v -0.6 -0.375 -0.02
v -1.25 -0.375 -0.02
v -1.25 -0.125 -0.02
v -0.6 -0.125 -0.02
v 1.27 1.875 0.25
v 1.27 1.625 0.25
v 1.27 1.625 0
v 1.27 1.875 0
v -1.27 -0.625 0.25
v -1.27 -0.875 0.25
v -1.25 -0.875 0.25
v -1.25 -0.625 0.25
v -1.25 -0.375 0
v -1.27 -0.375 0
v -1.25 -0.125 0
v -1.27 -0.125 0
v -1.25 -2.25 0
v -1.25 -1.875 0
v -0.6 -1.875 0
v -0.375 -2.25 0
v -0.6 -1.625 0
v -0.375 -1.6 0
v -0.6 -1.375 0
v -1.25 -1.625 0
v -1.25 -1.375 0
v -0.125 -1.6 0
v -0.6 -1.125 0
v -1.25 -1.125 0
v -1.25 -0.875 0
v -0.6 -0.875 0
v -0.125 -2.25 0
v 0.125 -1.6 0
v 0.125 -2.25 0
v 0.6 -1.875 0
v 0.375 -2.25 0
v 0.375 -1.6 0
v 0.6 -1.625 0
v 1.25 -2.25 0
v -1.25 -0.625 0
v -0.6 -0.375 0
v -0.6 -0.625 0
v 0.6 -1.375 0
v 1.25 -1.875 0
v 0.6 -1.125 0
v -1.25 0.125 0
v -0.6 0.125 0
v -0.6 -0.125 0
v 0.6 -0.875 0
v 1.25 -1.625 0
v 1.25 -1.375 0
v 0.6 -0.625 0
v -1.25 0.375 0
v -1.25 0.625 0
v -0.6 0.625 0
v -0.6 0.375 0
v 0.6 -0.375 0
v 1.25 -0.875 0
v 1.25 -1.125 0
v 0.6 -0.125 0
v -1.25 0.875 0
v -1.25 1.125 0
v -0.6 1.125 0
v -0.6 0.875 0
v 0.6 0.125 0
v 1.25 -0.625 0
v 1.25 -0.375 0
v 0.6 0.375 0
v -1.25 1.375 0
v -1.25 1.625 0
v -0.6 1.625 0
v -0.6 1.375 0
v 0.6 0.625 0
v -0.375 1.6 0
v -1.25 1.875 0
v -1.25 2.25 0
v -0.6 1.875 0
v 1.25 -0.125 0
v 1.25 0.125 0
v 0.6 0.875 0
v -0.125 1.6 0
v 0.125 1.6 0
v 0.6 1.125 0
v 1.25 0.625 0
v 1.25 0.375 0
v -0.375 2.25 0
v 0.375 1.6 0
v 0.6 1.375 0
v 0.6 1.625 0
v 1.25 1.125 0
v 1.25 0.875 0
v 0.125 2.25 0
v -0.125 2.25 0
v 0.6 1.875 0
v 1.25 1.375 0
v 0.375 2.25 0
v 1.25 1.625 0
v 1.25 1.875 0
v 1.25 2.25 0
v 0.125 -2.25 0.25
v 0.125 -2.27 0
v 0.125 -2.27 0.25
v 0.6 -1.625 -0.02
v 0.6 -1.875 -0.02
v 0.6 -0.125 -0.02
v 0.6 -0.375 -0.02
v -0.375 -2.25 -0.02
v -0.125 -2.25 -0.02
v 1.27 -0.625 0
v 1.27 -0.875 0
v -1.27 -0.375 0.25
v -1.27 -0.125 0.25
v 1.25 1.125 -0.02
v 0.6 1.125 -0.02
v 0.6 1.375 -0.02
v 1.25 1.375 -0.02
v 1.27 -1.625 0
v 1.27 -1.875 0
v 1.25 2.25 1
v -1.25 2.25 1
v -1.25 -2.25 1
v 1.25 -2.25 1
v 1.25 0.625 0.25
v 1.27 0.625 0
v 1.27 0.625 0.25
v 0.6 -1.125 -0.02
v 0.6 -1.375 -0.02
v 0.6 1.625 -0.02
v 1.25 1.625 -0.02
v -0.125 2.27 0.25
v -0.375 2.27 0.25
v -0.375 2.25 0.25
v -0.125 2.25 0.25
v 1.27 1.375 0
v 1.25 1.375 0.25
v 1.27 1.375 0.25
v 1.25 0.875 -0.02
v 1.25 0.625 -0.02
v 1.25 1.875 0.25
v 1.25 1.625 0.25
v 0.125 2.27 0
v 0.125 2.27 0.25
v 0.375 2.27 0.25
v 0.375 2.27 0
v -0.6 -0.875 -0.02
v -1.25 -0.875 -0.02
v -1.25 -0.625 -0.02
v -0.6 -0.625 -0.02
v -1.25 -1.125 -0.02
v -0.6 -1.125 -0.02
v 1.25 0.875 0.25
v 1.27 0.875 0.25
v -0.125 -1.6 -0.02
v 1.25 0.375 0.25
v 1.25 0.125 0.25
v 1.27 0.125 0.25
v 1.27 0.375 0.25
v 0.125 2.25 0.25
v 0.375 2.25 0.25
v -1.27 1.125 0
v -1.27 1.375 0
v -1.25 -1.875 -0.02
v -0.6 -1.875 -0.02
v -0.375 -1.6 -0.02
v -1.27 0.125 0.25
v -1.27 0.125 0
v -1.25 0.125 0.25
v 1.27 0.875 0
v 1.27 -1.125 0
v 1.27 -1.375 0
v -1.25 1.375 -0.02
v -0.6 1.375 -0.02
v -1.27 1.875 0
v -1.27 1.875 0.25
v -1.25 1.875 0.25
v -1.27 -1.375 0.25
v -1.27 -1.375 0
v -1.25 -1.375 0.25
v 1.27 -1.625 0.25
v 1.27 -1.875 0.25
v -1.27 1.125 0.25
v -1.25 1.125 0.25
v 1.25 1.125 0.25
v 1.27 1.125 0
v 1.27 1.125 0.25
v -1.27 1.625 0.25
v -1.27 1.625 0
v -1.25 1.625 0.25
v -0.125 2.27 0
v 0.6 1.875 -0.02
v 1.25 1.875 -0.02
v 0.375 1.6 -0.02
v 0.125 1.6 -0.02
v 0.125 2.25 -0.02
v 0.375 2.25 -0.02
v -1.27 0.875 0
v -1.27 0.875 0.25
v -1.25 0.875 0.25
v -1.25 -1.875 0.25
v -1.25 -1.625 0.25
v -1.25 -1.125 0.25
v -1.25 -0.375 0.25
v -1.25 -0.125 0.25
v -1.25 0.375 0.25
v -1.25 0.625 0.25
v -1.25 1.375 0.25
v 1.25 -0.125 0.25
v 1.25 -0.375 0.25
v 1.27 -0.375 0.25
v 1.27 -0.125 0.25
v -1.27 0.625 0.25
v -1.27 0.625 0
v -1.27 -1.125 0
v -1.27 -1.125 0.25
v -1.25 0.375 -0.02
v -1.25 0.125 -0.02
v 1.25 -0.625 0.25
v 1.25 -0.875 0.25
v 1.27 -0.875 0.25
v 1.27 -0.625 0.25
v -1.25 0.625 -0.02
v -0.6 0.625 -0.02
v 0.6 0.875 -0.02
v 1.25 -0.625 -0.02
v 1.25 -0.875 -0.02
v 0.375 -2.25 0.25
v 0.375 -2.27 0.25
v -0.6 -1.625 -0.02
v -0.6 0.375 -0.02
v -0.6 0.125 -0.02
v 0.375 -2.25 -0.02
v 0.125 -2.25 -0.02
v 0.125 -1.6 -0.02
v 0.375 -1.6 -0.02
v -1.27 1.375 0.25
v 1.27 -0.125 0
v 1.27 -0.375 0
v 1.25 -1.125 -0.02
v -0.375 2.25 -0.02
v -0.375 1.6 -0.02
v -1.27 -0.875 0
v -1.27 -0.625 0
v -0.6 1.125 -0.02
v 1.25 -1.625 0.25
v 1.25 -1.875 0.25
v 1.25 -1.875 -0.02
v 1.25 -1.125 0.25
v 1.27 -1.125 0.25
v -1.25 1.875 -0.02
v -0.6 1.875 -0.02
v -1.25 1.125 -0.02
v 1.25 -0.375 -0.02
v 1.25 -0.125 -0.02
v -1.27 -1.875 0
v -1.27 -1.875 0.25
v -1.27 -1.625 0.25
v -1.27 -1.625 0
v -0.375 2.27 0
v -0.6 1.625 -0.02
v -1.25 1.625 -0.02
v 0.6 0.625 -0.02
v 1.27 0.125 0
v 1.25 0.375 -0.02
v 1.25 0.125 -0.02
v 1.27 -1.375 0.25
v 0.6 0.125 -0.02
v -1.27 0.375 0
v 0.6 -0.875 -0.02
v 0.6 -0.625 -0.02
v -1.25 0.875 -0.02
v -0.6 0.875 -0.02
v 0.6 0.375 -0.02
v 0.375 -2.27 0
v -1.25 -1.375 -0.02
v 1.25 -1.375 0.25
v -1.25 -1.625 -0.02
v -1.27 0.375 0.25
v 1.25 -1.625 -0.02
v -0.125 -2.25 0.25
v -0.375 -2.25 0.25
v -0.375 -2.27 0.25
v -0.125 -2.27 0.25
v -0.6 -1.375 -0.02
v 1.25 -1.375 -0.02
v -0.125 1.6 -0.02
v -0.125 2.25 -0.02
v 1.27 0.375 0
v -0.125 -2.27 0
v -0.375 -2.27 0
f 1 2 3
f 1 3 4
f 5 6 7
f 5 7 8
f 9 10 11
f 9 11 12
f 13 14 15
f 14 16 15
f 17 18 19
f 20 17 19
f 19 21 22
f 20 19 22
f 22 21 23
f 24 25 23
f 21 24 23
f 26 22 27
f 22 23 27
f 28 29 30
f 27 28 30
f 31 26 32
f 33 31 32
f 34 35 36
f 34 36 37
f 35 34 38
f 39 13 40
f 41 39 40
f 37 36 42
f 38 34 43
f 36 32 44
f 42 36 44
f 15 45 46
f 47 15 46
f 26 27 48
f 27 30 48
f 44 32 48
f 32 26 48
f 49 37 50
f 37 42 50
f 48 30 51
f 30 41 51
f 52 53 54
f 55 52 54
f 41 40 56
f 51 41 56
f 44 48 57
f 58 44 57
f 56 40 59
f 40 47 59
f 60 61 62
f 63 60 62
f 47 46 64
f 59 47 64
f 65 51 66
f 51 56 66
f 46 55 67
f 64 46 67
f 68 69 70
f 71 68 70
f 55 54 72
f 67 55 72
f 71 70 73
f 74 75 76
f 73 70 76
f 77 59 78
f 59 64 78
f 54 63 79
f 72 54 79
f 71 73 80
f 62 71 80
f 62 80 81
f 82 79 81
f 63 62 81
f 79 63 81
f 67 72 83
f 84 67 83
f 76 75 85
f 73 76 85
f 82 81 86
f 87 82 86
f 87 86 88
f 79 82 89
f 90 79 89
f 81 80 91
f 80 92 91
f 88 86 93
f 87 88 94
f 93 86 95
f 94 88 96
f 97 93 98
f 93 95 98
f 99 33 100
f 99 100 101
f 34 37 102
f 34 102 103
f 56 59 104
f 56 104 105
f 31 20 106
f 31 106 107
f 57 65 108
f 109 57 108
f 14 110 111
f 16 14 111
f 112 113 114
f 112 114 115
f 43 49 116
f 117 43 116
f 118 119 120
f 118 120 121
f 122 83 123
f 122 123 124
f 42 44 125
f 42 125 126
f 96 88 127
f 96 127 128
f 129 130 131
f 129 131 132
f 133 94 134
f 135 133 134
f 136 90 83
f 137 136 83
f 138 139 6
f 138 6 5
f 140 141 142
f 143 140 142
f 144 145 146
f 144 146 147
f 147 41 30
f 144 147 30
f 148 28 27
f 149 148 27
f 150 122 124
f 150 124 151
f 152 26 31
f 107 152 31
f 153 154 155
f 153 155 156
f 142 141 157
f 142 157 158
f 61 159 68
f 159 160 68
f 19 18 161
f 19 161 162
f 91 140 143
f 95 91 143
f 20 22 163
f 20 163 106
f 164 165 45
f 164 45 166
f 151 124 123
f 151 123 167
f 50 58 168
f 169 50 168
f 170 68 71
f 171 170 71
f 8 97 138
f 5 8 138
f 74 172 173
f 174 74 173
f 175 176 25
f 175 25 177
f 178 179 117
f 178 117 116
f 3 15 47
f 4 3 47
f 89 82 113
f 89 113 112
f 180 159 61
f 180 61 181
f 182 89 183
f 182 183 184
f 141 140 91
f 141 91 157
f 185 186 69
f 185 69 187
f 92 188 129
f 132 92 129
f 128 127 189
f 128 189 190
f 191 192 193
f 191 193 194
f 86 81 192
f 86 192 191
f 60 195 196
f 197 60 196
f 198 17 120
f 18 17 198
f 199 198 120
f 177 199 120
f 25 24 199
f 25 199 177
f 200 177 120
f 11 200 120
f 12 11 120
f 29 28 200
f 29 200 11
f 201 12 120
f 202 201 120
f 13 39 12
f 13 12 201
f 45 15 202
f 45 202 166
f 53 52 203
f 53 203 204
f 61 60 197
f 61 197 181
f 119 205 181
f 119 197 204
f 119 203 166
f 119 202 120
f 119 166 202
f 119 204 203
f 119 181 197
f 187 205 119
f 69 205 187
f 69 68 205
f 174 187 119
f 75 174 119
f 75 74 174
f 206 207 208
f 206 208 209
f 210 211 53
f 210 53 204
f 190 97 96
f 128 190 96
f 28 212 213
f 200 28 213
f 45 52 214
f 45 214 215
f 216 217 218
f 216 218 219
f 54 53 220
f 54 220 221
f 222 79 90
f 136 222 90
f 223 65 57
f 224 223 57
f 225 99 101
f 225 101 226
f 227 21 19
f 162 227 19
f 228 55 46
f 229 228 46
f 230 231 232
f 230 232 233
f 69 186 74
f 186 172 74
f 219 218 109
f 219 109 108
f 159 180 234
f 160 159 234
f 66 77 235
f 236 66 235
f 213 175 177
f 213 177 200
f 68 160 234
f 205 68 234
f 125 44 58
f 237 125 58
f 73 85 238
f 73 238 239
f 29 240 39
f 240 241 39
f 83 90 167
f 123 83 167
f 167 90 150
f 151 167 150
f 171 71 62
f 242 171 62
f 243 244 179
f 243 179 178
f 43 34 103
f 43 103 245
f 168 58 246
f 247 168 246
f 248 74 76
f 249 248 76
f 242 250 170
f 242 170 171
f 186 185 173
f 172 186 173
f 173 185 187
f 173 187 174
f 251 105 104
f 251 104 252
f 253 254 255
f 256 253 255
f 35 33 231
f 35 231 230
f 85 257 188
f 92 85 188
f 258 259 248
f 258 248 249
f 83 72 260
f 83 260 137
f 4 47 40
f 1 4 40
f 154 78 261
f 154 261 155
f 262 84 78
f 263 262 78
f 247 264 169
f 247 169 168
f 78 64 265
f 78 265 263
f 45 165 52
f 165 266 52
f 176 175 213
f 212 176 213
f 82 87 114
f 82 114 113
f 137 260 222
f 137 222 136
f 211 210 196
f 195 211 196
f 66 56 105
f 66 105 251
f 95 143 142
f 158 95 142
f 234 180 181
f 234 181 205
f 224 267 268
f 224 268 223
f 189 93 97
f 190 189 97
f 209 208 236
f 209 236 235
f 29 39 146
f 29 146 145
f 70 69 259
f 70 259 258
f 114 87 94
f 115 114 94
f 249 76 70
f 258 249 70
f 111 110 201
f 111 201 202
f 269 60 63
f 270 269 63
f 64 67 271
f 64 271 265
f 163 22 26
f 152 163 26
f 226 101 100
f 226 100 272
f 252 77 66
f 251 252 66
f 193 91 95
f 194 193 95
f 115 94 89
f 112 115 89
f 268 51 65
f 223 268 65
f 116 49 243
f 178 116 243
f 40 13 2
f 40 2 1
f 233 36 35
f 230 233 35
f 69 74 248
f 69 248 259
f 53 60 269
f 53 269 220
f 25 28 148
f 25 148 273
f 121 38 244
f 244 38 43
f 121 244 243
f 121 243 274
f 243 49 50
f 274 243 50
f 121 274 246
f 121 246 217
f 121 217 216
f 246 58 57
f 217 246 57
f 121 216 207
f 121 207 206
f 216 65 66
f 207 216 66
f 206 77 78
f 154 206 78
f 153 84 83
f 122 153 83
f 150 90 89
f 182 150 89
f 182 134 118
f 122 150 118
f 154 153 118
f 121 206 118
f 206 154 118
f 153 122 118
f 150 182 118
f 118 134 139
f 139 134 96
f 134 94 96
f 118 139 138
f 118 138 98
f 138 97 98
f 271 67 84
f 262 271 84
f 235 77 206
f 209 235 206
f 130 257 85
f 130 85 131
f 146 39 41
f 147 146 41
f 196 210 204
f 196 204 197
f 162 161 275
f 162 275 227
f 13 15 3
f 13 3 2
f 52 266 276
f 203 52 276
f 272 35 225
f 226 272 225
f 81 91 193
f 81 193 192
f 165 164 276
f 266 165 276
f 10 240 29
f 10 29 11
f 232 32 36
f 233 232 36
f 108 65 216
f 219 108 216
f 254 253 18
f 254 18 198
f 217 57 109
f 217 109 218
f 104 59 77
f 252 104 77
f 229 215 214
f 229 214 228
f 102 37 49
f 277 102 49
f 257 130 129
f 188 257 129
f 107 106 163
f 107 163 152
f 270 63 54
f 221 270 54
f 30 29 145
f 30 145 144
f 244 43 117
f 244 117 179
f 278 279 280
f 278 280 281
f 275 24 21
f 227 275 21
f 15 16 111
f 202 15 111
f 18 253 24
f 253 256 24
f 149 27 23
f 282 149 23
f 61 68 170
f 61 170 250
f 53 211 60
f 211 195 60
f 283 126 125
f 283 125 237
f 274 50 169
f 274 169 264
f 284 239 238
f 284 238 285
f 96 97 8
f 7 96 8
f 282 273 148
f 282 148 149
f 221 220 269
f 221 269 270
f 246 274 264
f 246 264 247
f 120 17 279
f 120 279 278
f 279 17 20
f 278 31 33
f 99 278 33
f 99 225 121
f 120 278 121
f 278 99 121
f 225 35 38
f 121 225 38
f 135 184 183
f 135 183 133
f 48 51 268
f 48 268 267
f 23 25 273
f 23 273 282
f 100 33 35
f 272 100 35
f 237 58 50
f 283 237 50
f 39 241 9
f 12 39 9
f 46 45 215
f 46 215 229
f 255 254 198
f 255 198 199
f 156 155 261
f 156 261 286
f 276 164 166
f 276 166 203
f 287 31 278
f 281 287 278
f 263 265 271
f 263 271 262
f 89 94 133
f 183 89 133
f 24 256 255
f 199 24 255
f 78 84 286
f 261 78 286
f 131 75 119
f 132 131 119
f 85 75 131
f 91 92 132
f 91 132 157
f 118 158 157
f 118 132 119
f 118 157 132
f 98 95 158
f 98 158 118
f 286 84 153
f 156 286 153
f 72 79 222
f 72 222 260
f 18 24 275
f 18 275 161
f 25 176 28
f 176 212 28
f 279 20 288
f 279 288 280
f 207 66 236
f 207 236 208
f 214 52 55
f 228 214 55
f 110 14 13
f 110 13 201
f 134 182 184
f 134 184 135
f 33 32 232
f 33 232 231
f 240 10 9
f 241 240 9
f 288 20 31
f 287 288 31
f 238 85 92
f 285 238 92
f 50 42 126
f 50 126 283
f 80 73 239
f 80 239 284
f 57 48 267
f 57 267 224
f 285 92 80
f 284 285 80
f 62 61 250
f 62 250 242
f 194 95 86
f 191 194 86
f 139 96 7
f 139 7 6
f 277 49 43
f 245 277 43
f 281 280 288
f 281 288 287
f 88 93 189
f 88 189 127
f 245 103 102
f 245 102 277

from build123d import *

# Parameters (mm, degrees)
SKETCH_W               = 2.5
SKETCH_H               = 4.5
PAD_DEPTH              = 1
SKETCH001_W            = 0.25
SKETCH001_H            = 0.25
PAD001_DEPTH           = 0.02
LINEARPATTERN_COUNT    = 2
LINEARPATTERN_PITCH    = 2.52
SKETCH002_W            = 0.25
SKETCH002_H            = 0.25
PAD002_DEPTH           = 0.02
LINEARPATTERN001_COUNT = 2
LINEARPATTERN001_PITCH = 4.52
SKETCH003_W            = 0.65
SKETCH003_H            = 0.25
SKETCH003_W_2          = 0.25
SKETCH003_H_2          = 0.65
PAD003_DEPTH           = 0.02


with BuildPart() as part:
    # Sketch → Pad (new body)
    with BuildSketch(Plane.XY):
        Rectangle(SKETCH_W, SKETCH_H)
    extrude(amount=PAD_DEPTH)

    # Sketch001 (on Face2 of Pad) → Pad001 (join)
    with BuildSketch(Plane.YZ.offset(1.25)):
        with Locations((-0.25, 0.125)):
            Rectangle(SKETCH001_W, SKETCH001_H)
        with Locations((0.25, 0.125)):
            Rectangle(SKETCH001_W, SKETCH001_H)
        with Locations((-0.75, 0.125)):
            Rectangle(SKETCH001_W, SKETCH001_H)
        with Locations((-1.75, 0.125)):
            Rectangle(SKETCH001_W, SKETCH001_H)
        with Locations((-1.25, 0.125)):
            Rectangle(SKETCH001_W, SKETCH001_H)
        with Locations((0.75, 0.125)):
            Rectangle(SKETCH001_W, SKETCH001_H)
        with Locations((1.25, 0.125)):
            Rectangle(SKETCH001_W, SKETCH001_H)
        with Locations((1.75, 0.125)):
            Rectangle(SKETCH001_W, SKETCH001_H)
    pad001 = extrude(amount=PAD001_DEPTH)

    # LinearPattern: Pad001 ×2
    with Locations(*[(-i * LINEARPATTERN_PITCH, 0, 0) for i in range(1, LINEARPATTERN_COUNT)]):
        add(pad001)

    # Sketch002 (on Face30 of LinearPattern) → Pad002 (join)
    with BuildSketch(Plane.XZ.offset(2.25)):
        with Locations((-0.25, 0.125)):
            Rectangle(SKETCH002_W, SKETCH002_H)
        with Locations((0.25, 0.125)):
            Rectangle(SKETCH002_W, SKETCH002_H)
    pad002 = extrude(amount=PAD002_DEPTH)

    # LinearPattern001: Pad002 ×2
    with Locations(*[(0, i * LINEARPATTERN001_PITCH, 0) for i in range(1, LINEARPATTERN001_COUNT)]):
        add(pad002)

    # Sketch003 (on Face2 of LinearPattern001) → Pad003 (join)
    with BuildSketch(Plane(origin=(0, 0, 0), x_dir=(1, 0, 0), z_dir=(0, 0, -1))):
        with Locations((-0.925, 1.75)):
            Rectangle(SKETCH003_W, SKETCH003_H)
        with Locations((-0.925, 1.25)):
            Rectangle(SKETCH003_W, SKETCH003_H)
        with Locations((-0.925, 0.75)):
            Rectangle(SKETCH003_W, SKETCH003_H)
        with Locations((-0.925, 0.25)):
            Rectangle(SKETCH003_W, SKETCH003_H)
        with Locations((-0.925, -0.25)):
            Rectangle(SKETCH003_W, SKETCH003_H)
        with Locations((-0.925, -0.75)):
            Rectangle(SKETCH003_W, SKETCH003_H)
        with Locations((-0.925, -1.25)):
            Rectangle(SKETCH003_W, SKETCH003_H)
        with Locations((-0.925, -1.75)):
            Rectangle(SKETCH003_W, SKETCH003_H)
        with Locations((-0.25, -1.925)):
            Rectangle(SKETCH003_W_2, SKETCH003_H_2)
        with Locations((0.25, -1.925)):
            Rectangle(SKETCH003_W_2, SKETCH003_H_2)
        with Locations((0.925, -1.75)):
            Rectangle(SKETCH003_W, SKETCH003_H)
        with Locations((0.925, -1.25)):
            Rectangle(SKETCH003_W, SKETCH003_H)
        with Locations((0.925, -0.75)):
            Rectangle(SKETCH003_W, SKETCH003_H)
        with Locations((0.925, -0.25)):
            Rectangle(SKETCH003_W, SKETCH003_H)
        with Locations((0.925, 0.25)):
            Rectangle(SKETCH003_W, SKETCH003_H)
        with Locations((0.925, 0.75)):
            Rectangle(SKETCH003_W, SKETCH003_H)
        with Locations((0.925, 1.25)):
            Rectangle(SKETCH003_W, SKETCH003_H)
        with Locations((0.925, 1.75)):
            Rectangle(SKETCH003_W, SKETCH003_H)
        with Locations((0.25, 1.925)):
            Rectangle(SKETCH003_W_2, SKETCH003_H_2)
        with Locations((-0.25, 1.925)):
            Rectangle(SKETCH003_W_2, SKETCH003_H_2)
    extrude(amount=PAD003_DEPTH)


solid = part.part
